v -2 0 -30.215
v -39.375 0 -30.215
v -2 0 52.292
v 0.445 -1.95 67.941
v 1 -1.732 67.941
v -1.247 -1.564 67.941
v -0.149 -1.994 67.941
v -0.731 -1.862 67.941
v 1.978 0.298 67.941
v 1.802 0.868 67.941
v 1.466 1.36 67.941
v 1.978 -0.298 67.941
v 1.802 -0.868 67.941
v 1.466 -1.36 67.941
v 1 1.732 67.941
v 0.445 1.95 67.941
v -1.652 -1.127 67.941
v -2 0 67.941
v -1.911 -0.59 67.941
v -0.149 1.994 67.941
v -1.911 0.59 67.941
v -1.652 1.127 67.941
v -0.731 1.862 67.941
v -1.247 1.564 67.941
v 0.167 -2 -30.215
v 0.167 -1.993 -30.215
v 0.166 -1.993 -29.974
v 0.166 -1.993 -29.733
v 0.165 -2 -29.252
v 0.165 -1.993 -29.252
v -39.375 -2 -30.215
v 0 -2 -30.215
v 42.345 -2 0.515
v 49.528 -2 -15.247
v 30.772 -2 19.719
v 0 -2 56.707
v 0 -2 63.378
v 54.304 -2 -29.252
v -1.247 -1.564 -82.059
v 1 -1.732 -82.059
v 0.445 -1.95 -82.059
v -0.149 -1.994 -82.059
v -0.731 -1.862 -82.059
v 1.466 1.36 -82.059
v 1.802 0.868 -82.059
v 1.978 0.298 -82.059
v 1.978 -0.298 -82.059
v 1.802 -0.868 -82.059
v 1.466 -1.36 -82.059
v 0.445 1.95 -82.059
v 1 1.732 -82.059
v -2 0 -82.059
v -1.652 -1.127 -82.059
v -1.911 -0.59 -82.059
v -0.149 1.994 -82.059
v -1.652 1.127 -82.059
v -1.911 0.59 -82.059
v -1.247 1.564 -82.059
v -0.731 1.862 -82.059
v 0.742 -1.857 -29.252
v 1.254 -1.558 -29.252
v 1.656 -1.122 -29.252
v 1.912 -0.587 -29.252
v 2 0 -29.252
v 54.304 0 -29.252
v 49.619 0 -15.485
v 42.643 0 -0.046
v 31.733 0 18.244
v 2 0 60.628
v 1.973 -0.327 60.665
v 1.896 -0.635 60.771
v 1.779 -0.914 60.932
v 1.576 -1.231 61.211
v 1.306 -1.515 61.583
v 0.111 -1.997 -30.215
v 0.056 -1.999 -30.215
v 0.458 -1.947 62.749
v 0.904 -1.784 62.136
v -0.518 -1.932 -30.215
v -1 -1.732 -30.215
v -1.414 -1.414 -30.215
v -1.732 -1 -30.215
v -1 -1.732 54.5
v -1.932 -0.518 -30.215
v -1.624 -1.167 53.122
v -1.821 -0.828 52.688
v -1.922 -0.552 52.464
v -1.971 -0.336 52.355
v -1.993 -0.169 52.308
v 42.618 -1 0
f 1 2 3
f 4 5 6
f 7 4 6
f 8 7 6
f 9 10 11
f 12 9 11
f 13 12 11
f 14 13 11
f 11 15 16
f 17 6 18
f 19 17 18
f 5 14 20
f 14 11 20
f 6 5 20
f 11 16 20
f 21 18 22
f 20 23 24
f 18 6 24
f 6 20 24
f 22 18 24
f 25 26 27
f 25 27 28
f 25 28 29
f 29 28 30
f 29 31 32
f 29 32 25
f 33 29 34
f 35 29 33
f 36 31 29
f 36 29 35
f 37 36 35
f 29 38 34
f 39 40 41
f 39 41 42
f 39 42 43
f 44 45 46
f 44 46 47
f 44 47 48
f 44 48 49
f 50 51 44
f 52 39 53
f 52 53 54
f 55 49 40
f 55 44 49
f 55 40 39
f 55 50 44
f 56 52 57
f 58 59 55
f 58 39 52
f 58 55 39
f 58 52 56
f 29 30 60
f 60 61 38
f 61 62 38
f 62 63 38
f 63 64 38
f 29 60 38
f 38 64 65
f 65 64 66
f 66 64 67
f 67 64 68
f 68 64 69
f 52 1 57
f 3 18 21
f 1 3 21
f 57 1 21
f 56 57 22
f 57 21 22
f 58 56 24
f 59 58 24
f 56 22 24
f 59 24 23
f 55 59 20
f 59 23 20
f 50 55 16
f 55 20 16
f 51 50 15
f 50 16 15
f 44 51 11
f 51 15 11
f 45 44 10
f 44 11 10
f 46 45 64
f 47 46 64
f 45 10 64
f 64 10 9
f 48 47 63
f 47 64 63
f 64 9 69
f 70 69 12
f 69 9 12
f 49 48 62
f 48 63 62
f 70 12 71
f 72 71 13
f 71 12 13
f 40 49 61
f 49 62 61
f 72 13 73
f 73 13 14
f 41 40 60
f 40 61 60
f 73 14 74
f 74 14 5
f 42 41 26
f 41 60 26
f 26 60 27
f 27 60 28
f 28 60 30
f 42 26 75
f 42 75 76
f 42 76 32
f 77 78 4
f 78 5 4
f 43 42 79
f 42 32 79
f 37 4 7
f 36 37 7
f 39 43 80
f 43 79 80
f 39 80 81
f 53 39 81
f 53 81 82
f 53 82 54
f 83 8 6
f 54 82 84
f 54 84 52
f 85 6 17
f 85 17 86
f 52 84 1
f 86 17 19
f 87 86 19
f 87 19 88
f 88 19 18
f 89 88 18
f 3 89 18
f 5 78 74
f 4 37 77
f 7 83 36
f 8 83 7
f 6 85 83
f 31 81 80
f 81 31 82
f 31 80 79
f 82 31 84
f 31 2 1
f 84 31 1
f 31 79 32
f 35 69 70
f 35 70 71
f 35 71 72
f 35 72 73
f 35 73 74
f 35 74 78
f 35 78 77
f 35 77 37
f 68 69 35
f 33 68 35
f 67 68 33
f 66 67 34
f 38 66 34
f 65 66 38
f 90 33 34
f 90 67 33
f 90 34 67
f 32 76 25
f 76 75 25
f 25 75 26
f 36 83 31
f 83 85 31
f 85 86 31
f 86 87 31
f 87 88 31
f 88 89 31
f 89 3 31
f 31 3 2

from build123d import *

# Parameters (mm, degrees)
F1_W     = 2
F1_H     = 150
F5_DEPTH = 2
F7_DEPTH = 2


# Not quite as in the source:
# - the program builds the solid bodies; features that only make, move or delete a surface that nothing else refers to are left out


with BuildPart() as f4:
    # F1 (on Front) → F4 (revolve)
    with BuildSketch(Plane.XZ):
        with Locations((-1, -7.0591911674)):
            Rectangle(F1_W, F1_H)
    revolve(axis=Axis((0, 0, 16.0941202193), (0, 0, -1)))

    # F0 (on Front) → F5 (join)
    with BuildSketch(Plane.XZ):
        with BuildLine():
            Line((0, 63.3778050542), (0, -29.2516257614))
            Line((0, -29.2516257614), (54.3039664626, -29.2516257614))
            add(Edge.make_bspline(
                [(0, 63.3778050542), (16.6847622445, 40.4423802167), (44.0846316514, 2.7776154372), (51.4310467474, -20.2473764435), (54.3039664626, -29.2516257614)],
                knots=[0, 0, 0, 0, 0.6089358309, 1, 1, 1, 1], degree=3))
        make_face()
    extrude(amount=F5_DEPTH)

    # F2 (on Front) → F7 (join)
    with BuildSketch(Plane.XZ):
        Polygon((0.1667886972, -30.2148442715), (0, 56.7073263228), (-39.3750006333, -30.2148442715), align=None)
    extrude(amount=F7_DEPTH)


solid = f4.part
